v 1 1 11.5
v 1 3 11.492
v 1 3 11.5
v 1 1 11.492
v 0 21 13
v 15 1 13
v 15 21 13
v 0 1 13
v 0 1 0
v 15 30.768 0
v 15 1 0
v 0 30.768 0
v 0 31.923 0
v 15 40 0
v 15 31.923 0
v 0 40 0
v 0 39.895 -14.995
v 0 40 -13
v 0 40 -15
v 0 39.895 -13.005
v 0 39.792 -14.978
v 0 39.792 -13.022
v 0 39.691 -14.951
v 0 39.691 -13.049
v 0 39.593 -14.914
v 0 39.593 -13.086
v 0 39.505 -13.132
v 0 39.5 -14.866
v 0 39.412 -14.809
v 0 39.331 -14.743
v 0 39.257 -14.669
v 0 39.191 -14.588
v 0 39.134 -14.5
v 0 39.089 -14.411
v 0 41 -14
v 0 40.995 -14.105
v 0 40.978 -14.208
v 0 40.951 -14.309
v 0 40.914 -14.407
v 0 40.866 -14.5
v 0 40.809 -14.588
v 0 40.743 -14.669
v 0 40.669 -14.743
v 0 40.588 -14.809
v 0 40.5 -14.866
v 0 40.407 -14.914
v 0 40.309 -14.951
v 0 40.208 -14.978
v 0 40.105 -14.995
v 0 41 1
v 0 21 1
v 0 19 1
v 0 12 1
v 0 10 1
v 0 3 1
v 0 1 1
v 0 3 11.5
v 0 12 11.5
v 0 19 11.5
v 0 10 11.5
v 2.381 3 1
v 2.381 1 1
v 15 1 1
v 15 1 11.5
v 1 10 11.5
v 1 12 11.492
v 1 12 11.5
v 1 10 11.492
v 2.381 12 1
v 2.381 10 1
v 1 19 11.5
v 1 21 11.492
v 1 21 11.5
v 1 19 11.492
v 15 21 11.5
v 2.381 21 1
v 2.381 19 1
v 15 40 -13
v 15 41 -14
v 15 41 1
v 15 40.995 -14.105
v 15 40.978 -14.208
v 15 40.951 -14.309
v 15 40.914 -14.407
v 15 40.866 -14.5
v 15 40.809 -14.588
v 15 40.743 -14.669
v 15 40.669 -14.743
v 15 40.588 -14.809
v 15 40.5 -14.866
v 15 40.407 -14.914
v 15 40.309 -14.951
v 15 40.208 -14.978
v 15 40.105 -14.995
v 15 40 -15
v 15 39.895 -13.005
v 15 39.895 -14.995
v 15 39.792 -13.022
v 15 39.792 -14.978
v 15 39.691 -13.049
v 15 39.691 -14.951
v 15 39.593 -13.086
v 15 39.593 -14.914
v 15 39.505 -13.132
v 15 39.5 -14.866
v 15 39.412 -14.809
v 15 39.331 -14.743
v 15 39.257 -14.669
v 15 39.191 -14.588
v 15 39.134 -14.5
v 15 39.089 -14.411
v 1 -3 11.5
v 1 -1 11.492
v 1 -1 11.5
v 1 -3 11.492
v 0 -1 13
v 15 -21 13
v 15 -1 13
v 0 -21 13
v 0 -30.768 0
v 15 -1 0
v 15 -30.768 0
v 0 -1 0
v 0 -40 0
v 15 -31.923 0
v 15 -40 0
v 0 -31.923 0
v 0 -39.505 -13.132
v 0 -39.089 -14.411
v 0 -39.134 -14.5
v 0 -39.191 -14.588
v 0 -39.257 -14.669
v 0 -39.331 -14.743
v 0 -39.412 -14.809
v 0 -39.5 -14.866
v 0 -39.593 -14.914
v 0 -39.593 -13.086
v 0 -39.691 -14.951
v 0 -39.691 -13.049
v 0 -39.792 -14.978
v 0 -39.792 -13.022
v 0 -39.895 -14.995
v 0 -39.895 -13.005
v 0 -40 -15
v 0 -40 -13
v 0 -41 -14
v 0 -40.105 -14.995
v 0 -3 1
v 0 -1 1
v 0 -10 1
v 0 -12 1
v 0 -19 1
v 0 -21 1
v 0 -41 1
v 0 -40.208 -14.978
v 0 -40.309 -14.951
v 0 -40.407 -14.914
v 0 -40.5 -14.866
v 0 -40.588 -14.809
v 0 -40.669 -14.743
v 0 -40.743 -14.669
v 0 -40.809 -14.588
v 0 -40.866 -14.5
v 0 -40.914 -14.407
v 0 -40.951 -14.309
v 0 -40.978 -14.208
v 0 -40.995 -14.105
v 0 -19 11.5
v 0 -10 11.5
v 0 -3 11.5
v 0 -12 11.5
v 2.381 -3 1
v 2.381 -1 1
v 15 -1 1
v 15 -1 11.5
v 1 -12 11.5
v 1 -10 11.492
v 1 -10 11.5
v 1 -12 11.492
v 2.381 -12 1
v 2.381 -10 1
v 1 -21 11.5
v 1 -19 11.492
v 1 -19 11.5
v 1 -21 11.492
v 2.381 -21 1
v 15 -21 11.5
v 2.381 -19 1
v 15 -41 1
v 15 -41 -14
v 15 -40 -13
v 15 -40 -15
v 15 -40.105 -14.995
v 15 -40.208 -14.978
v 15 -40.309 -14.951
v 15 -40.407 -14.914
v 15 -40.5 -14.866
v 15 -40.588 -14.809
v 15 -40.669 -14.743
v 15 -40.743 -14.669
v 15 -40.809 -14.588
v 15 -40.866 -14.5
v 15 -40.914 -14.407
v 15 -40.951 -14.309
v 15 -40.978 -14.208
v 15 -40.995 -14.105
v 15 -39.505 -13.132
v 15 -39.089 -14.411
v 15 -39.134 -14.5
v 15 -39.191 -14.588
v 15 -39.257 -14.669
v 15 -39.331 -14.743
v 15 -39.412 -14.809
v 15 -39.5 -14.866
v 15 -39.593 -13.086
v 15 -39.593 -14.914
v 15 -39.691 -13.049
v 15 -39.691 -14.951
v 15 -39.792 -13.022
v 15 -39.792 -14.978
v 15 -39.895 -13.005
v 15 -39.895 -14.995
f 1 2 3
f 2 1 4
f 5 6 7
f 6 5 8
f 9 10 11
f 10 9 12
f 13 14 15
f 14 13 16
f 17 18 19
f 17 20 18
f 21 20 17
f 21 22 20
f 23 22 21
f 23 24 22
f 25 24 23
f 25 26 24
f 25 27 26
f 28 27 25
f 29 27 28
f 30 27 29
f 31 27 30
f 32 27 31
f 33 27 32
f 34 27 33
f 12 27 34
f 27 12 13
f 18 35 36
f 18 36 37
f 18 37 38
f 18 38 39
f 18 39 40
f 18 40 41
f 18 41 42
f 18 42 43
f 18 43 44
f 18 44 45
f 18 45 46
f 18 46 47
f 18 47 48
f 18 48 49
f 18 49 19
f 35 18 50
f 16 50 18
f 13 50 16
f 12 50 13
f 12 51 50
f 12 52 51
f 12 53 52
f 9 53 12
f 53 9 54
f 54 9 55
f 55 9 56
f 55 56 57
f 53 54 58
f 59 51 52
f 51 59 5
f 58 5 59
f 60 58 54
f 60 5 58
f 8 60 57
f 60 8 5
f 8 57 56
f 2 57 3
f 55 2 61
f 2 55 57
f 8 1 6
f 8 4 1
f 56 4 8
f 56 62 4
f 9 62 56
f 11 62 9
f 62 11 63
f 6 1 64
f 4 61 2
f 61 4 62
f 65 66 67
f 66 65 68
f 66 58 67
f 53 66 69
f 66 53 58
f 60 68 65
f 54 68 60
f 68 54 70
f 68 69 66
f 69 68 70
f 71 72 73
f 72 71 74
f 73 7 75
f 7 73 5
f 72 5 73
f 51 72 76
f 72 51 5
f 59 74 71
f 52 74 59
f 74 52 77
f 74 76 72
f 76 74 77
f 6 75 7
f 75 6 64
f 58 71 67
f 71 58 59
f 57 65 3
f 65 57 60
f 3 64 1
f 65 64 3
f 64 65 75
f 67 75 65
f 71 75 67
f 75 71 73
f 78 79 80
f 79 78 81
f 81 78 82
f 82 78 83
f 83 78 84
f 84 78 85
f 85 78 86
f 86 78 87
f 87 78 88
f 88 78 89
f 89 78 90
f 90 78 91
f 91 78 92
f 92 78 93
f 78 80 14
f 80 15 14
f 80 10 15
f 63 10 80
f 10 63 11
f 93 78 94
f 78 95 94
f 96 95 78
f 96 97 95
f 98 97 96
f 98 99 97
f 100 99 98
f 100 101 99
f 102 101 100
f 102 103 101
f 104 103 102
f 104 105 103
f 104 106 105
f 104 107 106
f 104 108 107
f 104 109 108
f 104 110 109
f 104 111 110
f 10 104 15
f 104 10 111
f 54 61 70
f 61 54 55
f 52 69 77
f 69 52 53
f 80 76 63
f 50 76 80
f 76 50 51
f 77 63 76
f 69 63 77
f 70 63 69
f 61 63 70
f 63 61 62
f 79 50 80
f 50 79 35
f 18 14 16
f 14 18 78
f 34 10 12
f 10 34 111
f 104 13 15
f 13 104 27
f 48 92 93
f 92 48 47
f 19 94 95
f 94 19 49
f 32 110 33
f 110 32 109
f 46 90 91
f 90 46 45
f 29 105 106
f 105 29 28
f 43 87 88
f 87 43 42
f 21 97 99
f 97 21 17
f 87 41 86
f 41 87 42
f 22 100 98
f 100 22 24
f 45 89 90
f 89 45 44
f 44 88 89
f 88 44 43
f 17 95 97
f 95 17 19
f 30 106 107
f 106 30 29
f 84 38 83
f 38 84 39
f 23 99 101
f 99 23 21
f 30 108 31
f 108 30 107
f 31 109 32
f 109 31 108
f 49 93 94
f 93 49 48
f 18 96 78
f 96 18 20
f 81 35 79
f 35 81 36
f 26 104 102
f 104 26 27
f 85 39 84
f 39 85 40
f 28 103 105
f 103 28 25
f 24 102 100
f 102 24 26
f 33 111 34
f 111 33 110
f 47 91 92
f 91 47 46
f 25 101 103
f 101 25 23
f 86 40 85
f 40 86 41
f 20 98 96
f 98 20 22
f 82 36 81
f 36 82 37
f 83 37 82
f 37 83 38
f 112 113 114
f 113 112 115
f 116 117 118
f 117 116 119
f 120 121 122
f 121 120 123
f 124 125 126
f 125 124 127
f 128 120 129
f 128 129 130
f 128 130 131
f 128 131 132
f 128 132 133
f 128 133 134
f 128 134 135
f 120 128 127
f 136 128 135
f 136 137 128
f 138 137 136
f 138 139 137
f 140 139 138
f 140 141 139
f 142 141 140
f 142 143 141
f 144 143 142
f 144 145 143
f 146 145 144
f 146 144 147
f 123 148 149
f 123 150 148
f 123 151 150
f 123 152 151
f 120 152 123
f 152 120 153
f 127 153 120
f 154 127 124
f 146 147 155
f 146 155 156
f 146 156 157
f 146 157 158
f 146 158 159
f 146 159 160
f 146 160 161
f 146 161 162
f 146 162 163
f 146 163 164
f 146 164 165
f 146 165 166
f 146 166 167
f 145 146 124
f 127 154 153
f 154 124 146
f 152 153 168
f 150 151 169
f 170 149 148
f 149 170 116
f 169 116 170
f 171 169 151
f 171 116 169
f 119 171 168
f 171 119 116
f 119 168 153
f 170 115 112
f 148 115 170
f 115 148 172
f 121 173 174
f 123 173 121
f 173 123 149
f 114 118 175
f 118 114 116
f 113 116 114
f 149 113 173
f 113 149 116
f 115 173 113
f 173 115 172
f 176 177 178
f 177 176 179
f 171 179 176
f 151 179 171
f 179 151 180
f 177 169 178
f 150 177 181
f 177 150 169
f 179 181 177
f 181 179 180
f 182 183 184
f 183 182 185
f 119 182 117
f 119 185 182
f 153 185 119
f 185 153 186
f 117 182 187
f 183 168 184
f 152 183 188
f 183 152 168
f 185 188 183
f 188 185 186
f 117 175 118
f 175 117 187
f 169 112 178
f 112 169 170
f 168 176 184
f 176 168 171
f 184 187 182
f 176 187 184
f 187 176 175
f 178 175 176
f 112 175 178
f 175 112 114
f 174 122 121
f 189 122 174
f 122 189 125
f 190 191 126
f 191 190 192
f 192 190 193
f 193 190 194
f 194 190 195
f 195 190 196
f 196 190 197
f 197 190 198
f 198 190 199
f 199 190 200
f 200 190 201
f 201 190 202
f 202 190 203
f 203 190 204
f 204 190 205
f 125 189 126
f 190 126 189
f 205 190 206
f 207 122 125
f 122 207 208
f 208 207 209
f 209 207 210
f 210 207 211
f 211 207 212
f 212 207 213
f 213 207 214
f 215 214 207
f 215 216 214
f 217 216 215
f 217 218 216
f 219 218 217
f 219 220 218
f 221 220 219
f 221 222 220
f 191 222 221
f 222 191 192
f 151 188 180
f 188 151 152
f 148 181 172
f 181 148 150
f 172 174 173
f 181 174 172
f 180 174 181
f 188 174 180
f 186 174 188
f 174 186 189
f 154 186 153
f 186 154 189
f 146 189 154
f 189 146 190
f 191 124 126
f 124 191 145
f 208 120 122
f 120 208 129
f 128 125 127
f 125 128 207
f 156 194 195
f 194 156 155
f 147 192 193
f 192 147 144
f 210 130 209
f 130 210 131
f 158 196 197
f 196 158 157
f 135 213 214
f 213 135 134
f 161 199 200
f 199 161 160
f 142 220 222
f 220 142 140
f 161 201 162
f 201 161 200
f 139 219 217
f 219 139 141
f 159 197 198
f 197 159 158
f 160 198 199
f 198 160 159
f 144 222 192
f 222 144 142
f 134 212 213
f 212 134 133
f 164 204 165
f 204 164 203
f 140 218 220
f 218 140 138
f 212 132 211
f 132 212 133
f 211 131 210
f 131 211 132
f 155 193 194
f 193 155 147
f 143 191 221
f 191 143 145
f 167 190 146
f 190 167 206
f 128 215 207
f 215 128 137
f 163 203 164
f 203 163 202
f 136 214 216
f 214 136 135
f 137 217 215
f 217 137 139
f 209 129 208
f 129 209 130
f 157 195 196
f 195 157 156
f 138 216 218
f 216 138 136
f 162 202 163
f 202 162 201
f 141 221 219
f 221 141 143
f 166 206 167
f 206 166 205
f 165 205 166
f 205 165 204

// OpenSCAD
// These are laptop elevation clamps for a Lenovo Thinkpad X1 laptop.

module stand() {
    cube([15, 40, 1.0]);
    translate([0, 39, -14]) cube([15, 1, 15]);
    translate([0, 38.14, -14.5]) rotate([30, 0, 0]) cube([15, 1, 17]);
    translate([0, 39, -14]) rotate([0, 90, 0]) cylinder(h=15, r=1, $fn=60);

    difference() {
        union() {
            translate([0, 0, 11.5]) cube([15, 20, 1.5]);

            for (i = [0 : 2]){
                #translate([0, i * 9, 0]) cube([1, 2, 13]);
                translate([1.0, i * 9, 0]) rotate([0, -7.5, 0]) cube([1.5, 2, 11.5]);
            }
        }
        translate([-2, 0, 0]) cube([2, 20, 15]);
    }
}

translate([0, 1, 0]) stand();
translate([0, -1, 0]) mirror([0, 1, 0]) stand();
